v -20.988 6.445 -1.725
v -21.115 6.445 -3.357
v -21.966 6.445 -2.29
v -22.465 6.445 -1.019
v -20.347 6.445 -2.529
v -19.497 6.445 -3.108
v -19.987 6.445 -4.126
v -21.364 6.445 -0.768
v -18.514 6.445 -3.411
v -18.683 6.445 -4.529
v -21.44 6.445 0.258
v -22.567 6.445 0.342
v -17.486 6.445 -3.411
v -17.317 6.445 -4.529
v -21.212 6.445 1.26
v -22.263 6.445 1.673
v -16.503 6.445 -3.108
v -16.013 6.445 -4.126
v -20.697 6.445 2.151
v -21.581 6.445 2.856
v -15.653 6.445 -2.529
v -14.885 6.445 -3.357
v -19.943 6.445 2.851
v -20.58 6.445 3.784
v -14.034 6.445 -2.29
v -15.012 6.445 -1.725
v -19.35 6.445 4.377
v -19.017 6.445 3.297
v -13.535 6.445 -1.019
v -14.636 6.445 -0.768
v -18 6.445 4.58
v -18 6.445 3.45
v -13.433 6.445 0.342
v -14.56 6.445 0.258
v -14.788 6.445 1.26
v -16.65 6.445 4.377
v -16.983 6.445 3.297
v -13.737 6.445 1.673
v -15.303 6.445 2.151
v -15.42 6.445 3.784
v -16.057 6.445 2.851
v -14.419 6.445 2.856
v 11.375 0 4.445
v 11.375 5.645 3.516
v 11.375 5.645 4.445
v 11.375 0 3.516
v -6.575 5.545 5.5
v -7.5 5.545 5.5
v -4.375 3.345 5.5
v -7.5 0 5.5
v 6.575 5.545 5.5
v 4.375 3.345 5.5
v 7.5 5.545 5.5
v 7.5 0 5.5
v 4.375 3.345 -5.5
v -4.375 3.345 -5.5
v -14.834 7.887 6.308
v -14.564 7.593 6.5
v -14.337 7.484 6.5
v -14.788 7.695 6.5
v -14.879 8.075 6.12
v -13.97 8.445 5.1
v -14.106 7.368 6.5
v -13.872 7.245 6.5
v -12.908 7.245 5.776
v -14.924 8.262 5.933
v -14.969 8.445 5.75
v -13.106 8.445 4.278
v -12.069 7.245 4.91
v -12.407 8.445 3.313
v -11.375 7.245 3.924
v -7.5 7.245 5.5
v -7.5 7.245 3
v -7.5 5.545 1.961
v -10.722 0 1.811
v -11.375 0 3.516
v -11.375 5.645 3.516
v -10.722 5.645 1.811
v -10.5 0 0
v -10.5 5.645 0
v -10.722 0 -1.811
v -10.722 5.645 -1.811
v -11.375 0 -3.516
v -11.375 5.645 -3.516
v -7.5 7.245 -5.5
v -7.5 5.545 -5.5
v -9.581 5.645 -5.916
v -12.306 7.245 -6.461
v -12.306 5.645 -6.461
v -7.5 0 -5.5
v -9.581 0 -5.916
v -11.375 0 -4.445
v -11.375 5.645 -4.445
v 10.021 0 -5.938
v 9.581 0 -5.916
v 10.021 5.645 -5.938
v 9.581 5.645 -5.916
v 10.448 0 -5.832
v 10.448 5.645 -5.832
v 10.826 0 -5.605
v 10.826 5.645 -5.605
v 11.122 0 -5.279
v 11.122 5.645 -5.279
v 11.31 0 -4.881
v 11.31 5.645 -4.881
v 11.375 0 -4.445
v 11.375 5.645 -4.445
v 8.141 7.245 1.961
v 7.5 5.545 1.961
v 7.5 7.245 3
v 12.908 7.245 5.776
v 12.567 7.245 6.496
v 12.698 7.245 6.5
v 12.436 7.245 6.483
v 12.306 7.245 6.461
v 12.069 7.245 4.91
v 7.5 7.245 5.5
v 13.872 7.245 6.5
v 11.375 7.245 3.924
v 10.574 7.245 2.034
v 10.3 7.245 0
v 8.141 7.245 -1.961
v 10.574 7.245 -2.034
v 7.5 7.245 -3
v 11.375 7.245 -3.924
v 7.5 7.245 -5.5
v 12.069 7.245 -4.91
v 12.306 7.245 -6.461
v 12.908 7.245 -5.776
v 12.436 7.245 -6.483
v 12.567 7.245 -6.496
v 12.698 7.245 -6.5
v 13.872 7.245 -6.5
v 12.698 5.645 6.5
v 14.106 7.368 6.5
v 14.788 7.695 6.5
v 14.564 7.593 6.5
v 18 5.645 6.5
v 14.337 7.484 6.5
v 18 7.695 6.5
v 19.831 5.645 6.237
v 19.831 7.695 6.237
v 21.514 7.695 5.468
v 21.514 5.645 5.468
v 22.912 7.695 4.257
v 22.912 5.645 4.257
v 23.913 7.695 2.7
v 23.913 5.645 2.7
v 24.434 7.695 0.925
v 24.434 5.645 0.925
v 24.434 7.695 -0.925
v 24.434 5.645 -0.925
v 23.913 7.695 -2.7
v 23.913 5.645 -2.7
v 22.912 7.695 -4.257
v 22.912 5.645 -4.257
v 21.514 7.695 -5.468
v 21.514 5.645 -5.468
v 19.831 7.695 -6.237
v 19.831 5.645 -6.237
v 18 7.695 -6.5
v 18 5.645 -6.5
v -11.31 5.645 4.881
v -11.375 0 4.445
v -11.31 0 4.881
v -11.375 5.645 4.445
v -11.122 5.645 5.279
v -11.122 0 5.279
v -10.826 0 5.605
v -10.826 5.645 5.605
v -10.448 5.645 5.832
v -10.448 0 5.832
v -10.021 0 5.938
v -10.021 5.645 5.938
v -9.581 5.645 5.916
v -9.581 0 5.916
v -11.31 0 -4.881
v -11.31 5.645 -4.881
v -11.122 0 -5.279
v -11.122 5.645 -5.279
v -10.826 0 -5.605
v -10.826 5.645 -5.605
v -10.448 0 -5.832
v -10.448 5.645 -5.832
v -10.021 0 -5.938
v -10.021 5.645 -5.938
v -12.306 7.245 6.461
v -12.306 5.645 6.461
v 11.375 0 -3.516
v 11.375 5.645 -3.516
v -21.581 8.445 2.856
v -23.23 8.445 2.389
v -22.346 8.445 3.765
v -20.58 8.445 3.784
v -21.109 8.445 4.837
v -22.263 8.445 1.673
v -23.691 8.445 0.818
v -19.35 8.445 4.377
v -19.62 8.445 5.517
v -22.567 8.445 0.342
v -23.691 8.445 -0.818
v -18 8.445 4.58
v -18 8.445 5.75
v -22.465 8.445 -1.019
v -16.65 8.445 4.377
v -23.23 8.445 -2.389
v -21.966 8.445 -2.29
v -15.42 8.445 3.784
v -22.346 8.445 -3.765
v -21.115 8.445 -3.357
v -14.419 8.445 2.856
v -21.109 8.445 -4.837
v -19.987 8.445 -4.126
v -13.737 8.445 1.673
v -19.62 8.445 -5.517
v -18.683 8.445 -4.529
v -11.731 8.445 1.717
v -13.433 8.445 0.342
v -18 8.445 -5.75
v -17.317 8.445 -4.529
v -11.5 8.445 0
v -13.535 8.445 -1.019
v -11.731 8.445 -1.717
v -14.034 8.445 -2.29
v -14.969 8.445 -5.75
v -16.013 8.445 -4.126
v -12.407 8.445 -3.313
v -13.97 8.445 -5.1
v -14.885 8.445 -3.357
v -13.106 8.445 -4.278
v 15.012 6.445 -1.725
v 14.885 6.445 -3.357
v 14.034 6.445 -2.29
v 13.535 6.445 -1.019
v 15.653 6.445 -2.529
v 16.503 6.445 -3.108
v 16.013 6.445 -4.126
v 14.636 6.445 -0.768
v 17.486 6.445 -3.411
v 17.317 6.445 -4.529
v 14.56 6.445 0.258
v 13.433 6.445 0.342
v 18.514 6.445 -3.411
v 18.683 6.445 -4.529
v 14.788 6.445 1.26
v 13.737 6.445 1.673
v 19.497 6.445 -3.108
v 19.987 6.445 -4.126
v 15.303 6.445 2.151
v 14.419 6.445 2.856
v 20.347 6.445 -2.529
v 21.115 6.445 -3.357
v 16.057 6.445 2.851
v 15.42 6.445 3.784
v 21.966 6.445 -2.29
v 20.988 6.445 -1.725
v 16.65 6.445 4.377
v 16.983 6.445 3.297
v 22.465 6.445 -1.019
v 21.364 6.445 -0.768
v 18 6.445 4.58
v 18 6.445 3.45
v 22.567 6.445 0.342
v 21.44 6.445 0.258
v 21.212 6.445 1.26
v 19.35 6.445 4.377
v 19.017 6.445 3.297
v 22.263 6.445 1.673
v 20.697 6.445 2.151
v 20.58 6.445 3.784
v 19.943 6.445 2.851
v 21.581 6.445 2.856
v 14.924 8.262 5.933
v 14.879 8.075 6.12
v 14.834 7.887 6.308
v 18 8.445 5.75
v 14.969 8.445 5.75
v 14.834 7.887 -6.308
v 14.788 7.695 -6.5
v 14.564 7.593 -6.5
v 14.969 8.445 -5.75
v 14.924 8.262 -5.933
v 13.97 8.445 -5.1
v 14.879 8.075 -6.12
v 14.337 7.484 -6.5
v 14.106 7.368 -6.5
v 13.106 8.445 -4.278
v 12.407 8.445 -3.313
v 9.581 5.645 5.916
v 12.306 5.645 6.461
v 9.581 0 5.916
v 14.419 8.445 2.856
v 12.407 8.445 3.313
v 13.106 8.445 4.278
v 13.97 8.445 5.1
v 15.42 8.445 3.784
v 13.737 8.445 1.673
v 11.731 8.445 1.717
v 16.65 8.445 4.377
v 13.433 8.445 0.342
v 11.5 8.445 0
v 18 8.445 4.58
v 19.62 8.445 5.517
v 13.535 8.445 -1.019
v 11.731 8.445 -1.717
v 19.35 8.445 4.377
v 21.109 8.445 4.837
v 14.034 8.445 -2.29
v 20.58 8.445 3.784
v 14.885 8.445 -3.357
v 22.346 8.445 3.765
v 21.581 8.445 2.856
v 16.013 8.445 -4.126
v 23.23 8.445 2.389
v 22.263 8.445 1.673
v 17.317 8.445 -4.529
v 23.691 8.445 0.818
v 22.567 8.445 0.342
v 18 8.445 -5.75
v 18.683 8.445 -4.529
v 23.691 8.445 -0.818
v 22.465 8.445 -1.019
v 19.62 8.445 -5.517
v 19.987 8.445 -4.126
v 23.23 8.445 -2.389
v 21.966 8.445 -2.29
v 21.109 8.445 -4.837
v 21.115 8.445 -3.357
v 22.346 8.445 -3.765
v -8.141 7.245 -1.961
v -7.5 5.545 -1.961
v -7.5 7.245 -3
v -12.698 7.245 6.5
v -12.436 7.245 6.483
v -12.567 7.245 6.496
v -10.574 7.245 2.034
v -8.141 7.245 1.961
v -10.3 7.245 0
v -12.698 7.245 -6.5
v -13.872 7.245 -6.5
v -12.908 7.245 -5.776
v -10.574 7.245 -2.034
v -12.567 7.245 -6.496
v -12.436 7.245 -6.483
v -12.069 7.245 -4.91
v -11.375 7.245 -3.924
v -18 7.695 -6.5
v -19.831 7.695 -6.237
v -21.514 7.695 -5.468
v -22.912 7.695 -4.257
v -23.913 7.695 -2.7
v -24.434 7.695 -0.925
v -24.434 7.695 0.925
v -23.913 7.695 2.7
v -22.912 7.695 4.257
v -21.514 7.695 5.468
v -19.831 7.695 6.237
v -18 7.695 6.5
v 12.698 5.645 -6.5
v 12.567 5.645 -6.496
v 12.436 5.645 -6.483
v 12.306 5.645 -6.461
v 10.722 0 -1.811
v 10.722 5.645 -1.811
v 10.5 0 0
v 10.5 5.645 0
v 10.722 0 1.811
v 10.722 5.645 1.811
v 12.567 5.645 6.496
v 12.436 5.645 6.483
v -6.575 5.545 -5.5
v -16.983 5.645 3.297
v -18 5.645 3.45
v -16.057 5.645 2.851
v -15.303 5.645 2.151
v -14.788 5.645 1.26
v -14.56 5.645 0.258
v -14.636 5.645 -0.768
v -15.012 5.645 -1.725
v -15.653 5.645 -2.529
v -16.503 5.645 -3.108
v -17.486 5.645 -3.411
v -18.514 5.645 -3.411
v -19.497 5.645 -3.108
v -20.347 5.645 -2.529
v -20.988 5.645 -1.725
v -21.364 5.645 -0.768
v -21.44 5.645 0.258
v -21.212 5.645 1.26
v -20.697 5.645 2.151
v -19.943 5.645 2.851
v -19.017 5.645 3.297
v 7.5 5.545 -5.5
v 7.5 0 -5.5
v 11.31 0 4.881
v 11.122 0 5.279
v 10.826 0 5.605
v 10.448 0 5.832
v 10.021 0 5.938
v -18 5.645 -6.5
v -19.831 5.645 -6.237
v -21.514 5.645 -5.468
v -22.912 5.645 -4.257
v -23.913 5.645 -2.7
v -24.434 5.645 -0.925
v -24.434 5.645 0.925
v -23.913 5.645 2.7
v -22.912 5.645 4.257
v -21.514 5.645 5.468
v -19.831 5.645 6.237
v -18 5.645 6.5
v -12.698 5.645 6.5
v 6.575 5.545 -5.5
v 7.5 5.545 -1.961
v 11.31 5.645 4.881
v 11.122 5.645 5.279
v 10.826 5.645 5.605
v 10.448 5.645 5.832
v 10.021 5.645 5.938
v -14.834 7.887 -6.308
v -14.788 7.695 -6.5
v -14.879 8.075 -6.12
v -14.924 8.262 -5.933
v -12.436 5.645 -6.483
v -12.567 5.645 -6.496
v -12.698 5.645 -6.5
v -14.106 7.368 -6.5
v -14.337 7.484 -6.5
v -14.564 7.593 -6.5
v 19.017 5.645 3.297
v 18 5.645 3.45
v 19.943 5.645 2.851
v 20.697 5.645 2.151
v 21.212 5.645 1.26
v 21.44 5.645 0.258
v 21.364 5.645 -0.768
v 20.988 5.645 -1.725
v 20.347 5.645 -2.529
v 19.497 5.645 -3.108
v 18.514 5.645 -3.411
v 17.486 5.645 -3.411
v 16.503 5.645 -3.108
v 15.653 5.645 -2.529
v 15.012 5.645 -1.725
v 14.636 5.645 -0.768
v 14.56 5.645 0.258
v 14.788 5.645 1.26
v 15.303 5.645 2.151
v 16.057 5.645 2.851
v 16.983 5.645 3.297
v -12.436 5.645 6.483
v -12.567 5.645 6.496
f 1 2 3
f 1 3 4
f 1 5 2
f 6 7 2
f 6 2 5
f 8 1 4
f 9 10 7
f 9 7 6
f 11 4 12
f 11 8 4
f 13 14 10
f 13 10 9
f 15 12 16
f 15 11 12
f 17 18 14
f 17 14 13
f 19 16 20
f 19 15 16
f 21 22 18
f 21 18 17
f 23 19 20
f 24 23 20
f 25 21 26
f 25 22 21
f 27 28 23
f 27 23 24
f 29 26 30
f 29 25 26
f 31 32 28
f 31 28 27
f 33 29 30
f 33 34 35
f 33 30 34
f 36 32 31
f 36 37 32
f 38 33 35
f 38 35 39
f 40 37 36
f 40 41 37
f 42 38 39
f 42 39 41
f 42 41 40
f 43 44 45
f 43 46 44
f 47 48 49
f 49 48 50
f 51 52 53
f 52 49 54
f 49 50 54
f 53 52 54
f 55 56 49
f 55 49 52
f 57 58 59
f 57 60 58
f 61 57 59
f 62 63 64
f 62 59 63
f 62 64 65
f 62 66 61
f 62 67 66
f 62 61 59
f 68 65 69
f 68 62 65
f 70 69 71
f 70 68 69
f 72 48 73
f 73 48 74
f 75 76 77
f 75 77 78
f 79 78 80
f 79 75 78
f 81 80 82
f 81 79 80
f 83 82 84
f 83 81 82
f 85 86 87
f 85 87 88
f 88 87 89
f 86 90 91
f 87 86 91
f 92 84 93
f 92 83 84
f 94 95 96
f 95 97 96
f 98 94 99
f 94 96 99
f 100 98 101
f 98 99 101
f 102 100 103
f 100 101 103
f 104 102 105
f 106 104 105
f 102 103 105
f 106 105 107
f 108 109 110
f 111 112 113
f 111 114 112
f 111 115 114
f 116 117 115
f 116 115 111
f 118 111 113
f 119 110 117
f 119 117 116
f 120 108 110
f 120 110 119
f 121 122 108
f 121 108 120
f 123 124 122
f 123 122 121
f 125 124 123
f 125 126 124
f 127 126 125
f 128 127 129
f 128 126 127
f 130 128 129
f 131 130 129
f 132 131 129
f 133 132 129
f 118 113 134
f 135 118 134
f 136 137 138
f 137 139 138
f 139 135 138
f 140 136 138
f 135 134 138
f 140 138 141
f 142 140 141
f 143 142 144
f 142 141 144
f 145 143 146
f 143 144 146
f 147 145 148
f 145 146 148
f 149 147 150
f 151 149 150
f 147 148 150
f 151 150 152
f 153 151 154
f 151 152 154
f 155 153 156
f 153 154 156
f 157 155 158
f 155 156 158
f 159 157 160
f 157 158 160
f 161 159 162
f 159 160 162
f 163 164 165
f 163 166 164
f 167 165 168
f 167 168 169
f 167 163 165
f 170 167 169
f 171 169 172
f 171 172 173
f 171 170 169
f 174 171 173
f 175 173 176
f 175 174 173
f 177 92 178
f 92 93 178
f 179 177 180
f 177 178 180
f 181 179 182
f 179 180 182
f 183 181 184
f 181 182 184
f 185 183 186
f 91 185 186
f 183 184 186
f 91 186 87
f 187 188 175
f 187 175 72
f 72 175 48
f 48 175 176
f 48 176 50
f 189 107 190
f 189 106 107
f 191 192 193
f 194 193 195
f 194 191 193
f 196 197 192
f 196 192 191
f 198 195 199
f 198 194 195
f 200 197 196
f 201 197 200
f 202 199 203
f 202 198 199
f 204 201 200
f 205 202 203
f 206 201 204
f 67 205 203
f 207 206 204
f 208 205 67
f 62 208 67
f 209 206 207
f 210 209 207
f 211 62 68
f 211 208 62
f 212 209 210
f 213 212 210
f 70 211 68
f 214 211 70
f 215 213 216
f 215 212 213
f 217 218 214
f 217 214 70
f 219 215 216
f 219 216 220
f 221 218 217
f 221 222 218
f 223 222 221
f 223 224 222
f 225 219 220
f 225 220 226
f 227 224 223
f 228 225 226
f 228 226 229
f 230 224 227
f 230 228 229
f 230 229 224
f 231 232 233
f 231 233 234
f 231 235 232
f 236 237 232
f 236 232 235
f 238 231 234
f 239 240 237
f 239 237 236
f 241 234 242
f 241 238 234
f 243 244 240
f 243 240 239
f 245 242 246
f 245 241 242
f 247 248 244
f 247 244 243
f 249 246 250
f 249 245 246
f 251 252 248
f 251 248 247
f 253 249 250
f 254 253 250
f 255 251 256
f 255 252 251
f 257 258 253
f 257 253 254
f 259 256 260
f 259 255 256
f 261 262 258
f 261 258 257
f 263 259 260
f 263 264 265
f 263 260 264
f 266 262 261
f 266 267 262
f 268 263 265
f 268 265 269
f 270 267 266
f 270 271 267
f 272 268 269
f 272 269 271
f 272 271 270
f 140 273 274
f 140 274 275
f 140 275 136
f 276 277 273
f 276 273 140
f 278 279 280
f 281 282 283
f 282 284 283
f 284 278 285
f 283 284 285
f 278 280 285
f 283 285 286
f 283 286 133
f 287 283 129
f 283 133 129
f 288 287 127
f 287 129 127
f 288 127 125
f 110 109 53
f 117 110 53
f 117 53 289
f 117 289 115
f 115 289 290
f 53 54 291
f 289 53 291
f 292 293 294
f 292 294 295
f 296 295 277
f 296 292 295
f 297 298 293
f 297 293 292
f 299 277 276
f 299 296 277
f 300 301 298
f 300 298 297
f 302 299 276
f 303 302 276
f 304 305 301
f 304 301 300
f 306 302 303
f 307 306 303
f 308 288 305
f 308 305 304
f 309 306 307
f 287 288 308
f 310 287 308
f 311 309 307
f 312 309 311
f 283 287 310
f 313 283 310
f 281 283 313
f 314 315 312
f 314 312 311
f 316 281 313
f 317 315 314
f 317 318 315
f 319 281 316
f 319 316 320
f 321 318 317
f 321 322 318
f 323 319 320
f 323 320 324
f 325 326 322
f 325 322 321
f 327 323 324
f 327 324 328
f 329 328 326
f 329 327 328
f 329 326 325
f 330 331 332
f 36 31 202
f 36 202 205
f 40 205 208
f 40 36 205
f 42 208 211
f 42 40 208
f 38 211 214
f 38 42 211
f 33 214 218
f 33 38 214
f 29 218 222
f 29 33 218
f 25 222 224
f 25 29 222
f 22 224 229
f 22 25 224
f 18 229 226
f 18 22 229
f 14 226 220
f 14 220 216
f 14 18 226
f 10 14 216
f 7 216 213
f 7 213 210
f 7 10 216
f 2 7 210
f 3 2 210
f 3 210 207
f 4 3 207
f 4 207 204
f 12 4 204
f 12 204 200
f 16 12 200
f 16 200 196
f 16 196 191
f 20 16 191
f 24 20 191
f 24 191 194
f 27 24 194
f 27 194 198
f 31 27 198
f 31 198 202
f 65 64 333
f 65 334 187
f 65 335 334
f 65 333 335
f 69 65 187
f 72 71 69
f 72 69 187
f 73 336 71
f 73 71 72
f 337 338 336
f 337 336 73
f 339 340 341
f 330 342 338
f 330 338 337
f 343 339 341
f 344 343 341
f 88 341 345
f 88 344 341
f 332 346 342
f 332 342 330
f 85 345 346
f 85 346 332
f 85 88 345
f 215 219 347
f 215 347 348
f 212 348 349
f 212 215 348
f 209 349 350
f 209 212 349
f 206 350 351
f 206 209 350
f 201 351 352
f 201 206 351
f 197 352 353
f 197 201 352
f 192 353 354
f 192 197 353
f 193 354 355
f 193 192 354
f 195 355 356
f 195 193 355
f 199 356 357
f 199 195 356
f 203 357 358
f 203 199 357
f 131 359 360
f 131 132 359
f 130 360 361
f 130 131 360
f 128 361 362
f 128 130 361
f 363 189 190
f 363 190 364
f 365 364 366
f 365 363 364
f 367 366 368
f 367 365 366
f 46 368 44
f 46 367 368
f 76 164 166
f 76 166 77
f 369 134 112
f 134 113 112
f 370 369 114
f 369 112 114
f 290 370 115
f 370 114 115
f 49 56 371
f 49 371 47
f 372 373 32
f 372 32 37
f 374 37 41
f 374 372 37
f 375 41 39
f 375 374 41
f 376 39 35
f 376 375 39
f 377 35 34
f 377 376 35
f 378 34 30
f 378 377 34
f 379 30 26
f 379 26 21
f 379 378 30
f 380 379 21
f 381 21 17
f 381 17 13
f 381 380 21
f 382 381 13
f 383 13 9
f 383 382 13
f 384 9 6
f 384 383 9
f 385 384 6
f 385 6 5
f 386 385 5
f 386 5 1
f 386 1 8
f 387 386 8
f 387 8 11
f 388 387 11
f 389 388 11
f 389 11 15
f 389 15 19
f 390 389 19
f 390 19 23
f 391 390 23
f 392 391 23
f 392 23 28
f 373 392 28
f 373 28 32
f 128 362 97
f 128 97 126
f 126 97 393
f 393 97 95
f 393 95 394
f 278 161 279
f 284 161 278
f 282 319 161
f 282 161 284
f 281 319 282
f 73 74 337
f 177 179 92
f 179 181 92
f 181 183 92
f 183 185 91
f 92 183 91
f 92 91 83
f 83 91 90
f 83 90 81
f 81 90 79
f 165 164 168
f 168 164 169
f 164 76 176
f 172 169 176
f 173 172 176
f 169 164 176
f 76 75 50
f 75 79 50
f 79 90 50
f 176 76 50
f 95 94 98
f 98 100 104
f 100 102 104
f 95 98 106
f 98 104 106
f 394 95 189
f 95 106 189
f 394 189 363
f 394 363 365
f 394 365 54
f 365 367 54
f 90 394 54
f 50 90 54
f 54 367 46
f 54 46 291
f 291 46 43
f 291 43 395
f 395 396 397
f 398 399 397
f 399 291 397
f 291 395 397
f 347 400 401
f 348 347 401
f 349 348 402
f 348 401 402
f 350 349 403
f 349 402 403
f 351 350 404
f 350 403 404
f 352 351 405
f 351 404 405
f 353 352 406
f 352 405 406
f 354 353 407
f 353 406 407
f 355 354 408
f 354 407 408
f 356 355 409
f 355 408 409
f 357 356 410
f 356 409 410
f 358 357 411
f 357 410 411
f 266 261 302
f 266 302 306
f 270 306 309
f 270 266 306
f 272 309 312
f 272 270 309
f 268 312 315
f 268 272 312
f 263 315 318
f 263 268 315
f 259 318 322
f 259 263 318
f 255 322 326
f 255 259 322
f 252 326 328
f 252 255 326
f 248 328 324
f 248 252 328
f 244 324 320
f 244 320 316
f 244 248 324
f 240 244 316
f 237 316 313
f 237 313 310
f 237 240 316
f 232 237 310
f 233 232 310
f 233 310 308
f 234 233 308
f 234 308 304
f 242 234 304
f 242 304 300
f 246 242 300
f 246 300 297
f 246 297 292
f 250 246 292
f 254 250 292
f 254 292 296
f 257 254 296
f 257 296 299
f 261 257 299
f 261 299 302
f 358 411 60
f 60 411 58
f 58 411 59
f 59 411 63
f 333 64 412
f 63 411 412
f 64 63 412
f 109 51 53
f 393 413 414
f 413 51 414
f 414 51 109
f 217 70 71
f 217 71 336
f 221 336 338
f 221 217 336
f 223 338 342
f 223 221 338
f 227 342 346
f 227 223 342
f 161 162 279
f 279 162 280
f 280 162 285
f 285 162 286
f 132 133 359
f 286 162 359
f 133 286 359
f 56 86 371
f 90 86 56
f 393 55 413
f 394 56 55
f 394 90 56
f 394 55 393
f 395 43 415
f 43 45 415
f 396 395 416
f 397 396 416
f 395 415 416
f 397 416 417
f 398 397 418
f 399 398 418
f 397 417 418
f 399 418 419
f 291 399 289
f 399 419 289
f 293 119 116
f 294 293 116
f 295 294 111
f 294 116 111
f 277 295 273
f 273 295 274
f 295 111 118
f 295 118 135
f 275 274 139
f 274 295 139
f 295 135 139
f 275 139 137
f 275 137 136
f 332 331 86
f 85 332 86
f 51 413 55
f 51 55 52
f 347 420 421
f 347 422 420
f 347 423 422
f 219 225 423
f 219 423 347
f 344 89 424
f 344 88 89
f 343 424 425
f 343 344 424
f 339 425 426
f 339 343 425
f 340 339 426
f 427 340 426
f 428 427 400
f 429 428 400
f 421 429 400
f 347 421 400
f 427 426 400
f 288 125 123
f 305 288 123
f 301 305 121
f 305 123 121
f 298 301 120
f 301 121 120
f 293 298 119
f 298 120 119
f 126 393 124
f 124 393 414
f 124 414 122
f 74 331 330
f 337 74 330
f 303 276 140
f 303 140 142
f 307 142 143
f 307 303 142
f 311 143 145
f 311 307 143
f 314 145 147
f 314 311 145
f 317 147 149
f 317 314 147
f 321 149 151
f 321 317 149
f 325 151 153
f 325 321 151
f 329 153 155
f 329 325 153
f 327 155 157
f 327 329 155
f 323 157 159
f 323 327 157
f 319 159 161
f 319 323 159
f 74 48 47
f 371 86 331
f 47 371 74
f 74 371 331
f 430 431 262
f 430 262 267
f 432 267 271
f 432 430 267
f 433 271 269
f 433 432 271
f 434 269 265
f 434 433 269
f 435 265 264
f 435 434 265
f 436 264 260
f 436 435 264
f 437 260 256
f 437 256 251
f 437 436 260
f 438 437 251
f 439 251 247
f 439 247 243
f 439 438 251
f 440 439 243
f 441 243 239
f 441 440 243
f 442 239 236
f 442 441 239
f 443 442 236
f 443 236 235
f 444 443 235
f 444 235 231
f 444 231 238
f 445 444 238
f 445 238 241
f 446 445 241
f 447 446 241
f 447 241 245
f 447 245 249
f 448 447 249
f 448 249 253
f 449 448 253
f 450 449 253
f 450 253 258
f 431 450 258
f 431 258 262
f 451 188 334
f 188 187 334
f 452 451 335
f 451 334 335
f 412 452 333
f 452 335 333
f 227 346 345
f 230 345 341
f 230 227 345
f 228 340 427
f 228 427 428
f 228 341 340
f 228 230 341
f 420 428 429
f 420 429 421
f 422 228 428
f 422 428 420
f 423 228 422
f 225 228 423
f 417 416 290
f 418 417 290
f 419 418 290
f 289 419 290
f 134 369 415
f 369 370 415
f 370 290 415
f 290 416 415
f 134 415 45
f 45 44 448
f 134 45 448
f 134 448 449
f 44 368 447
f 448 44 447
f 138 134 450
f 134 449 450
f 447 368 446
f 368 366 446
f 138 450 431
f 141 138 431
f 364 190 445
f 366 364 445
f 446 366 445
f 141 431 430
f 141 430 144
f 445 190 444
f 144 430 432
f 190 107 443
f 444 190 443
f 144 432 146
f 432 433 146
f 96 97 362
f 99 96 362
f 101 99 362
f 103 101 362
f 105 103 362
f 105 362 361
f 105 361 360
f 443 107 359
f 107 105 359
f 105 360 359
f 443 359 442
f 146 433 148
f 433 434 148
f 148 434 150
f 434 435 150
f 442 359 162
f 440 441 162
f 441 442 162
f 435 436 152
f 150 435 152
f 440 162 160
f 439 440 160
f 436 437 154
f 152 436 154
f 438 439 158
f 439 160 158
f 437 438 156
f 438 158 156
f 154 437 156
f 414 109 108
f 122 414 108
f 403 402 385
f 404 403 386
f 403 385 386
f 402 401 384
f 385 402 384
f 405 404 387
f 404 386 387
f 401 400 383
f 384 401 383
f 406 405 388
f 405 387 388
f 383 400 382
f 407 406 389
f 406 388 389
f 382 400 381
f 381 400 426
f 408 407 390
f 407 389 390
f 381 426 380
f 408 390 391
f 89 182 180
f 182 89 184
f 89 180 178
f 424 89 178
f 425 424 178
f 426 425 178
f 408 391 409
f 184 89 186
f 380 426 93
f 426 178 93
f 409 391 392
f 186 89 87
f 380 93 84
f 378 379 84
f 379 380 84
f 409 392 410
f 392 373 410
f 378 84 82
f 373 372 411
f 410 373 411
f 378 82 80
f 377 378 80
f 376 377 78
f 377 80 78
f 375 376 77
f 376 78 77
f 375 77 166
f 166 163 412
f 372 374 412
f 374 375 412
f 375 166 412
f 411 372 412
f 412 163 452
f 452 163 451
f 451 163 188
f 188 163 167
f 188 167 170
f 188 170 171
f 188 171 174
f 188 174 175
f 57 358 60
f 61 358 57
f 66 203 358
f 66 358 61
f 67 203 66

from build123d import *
from OCP.BRepFilletAPI import BRepFilletAPI_MakeChamfer

# Parameters (mm, degrees)
SKETCH1_W               = 15
SKETCH1_H               = 11
BOSS_EXTRUDE1_DEPTH     = 5.545
BOSS_EXTRUDE2_DEPTH     = 7.245
SKETCH1_6_R             = 6.5
SKETCH1_6_R_2           = 4.58
BOSS_EXTRUDE3_DEPTH     = 8.445
SKETCH1_7_R             = 4.58
SKETCH1_7_R_2           = 3.45
BOSS_EXTRUDE4_DEPTH     = 6.445
SKETCH1_8_R             = 6.5
SKETCH1_8_R_2           = 4.58
SKETCH1_8_R_3           = 3.45
CUT_EXTRUDE1_DEPTH      = 5.645
CUT_EXTRUDE2_DEPTH      = 3
CUT_EXTRUDE3_DEPTH      = 27.717373093
CUT_EXTRUDE3_DEPTH_BACK = 27.717373093
SKETCH2_4_W             = 8.75
SKETCH2_4_H             = 2.2
CHAMFER1_SIZE           = 1.039230485
CHAMFER1_SIZE_2         = 0.6
CHAMFER2_SIZE           = 2.2
CHAMFER3_SIZE           = 0.75
CHAMFER4_SIZE           = 1.2
FILLET1_R               = 2
FILLET2_R               = 1.5


with BuildPart() as part:
    # Sketch1 → Boss-Extrude1 (new body)
    with BuildSketch(Plane(origin=(0, 0, 0), x_dir=(1, 0, 0), z_dir=(0, 1, 0))):
        Rectangle(SKETCH1_W, SKETCH1_H)
    extrude(amount=BOSS_EXTRUDE1_DEPTH)

    # Sketch1<5> → Boss-Extrude2 (add)
    with BuildSketch(Plane(origin=(0, 0, 0), x_dir=(1, 0, 0), z_dir=(0, 1, 0))):
        with BuildLine():
            Line((-12.5, 6.5), (-13.872046512, 6.5))
            ThreePointArc((-13.872046512, 6.5), (-12.47142118, 5.359553734), (-11.375, 3.924203741))
            Line((-11.375, 3.924203741), (-11.375, 6.275))
            Line((-11.375, 6.275), (-12.5, 6.5))
        make_face()
        with BuildLine():
            Line((-11.375, 6.275), (-11.375, 3.924203741))
            ThreePointArc((-11.375, 3.924203741), (-10.3, 0), (-11.375, -3.924203741))
            Line((-11.375, -3.924203741), (-11.375, -6.275))
            Line((-11.375, -6.275), (-7.5, -5.5))
            Line((-7.5, -5.5), (-7.5, 5.5))
            Line((-7.5, 5.5), (-11.375, 6.275))
        make_face()
        with BuildLine():
            ThreePointArc((-11.375, -3.924203741), (-12.47142118, -5.359553734), (-13.872046512, -6.5))
            Line((-13.872046512, -6.5), (-12.5, -6.5))
            Line((-12.5, -6.5), (-11.375, -6.275))
            Line((-11.375, -6.275), (-11.375, -3.924203741))
        make_face()
        with BuildLine():
            Line((12.5, 6.5), (11.375, 6.275))
            Line((11.375, 6.275), (11.375, 3.924203741))
            ThreePointArc((11.375, 3.924203741), (12.47142118, 5.359553734), (13.872046512, 6.5))
            Line((13.872046512, 6.5), (12.5, 6.5))
        make_face()
        with BuildLine():
            Line((11.375, 6.275), (7.5, 5.5))
            Line((7.5, 5.5), (7.5, -5.5))
            Line((7.5, -5.5), (11.375, -6.275))
            Line((11.375, -6.275), (11.375, -3.924203741))
            ThreePointArc((11.375, -3.924203741), (10.3, 0), (11.375, 3.924203741))
            Line((11.375, 3.924203741), (11.375, 6.275))
        make_face()
        with BuildLine():
            Line((11.375, -3.924203741), (11.375, -6.275))
            Line((11.375, -6.275), (12.5, -6.5))
            Line((12.5, -6.5), (13.872046512, -6.5))
            ThreePointArc((13.872046512, -6.5), (12.47142118, -5.359553734), (11.375, -3.924203741))
        make_face()
    extrude(amount=BOSS_EXTRUDE2_DEPTH)

    # Sketch1<6> → Boss-Extrude3 (add)
    # profile 1 of 6: a face of its own
    with BuildSketch(Plane(origin=(0, 0, 0), x_dir=(1, 0, 0), z_dir=(0, 1, 0))):
        with BuildLine():
            Line((-13.872046512, 6.5), (-18, 6.5))
            ThreePointArc((-18, 6.5), (-13.403805922, 4.596194078), (-11.5, 0))
            ThreePointArc((-11.5, 0), (-13.403805922, -4.596194078), (-18, -6.5))
            Line((-18, -6.5), (-13.872046512, -6.5))
            ThreePointArc((-13.872046512, -6.5), (-12.47142118, -5.359553734), (-11.375, -3.924203741))
            Line((-11.375, -3.924203741), (-11.375, -3.515590278))
            ThreePointArc((-11.375, -3.515590278), (-10.5, 0), (-11.375, 3.515590278))
            Line((-11.375, 3.515590278), (-11.375, 3.924203741))
            ThreePointArc((-11.375, 3.924203741), (-12.47142118, 5.359553734), (-13.872046512, 6.5))
        make_face()
    # profile 2 of 6: a face of its own
    with BuildSketch(Plane(origin=(0, 0, 0), x_dir=(1, 0, 0), z_dir=(0, 1, 0))):
        with Locations((-18, 0)):
            Circle(SKETCH1_6_R)
        with Locations(Location((-18, 0, 0), (0, 0, 270))):
            Circle(SKETCH1_6_R_2, mode=Mode.SUBTRACT)
    # profile 3 of 6: a face of its own
    with BuildSketch(Plane(origin=(0, 0, 0), x_dir=(1, 0, 0), z_dir=(0, 1, 0))):
        with BuildLine():
            ThreePointArc((13.872046512, 6.5), (12.47142118, 5.359553734), (11.375, 3.924203741))
            Line((11.375, 3.924203741), (11.375, 3.515590278))
            ThreePointArc((11.375, 3.515590278), (10.5, 0), (11.375, -3.515590278))
            Line((11.375, -3.515590278), (11.375, -3.924203741))
            ThreePointArc((11.375, -3.924203741), (12.47142118, -5.359553734), (13.872046512, -6.5))
            Line((13.872046512, -6.5), (18, -6.5))
            ThreePointArc((18, -6.5), (11.5, 0), (18, 6.5))
            Line((18, 6.5), (13.872046512, 6.5))
        make_face()
    # profile 4 of 6: a face of its own
    with BuildSketch(Plane(origin=(0, 0, 0), x_dir=(1, 0, 0), z_dir=(0, 1, 0))):
        with Locations((18, 0)):
            Circle(SKETCH1_6_R)
        with Locations(Location((18, 0, 0), (0, 0, 270))):
            Circle(SKETCH1_6_R_2, mode=Mode.SUBTRACT)
    # profile 5 of 6: a face of its own
    with BuildSketch(Plane(origin=(0, 0, 0), x_dir=(1, 0, 0), z_dir=(0, 1, 0))):
        with BuildLine():
            Line((11.375, 3.515590278), (11.375, 3.924203741))
            ThreePointArc((11.375, 3.924203741), (10.3, 0), (11.375, -3.924203741))
            Line((11.375, -3.924203741), (11.375, -3.515590278))
            ThreePointArc((11.375, -3.515590278), (10.5, 0), (11.375, 3.515590278))
        make_face()
    # profile 6 of 6: a face of its own
    with BuildSketch(Plane(origin=(0, 0, 0), x_dir=(1, 0, 0), z_dir=(0, 1, 0))):
        with BuildLine():
            ThreePointArc((-11.375, -3.924203741), (-10.3, 0), (-11.375, 3.924203741))
            Line((-11.375, 3.924203741), (-11.375, 3.515590278))
            ThreePointArc((-11.375, 3.515590278), (-10.5, 0), (-11.375, -3.515590278))
            Line((-11.375, -3.515590278), (-11.375, -3.924203741))
        make_face()
    extrude(amount=BOSS_EXTRUDE3_DEPTH)

    # Sketch1<7> → Boss-Extrude4 (add)
    # profile 1 of 2: a face of its own
    with BuildSketch(Plane(origin=(0, 0, 0), x_dir=(1, 0, 0), z_dir=(0, 1, 0))):
        with Locations(Location((-18, 0, 0), (0, 0, 270))):
            Circle(SKETCH1_7_R)
        with Locations(Location((-18, 0, 0), (0, 0, 270))):
            Circle(SKETCH1_7_R_2, mode=Mode.SUBTRACT)
    # profile 2 of 2: a face of its own
    with BuildSketch(Plane(origin=(0, 0, 0), x_dir=(1, 0, 0), z_dir=(0, 1, 0))):
        with Locations(Location((18, 0, 0), (0, 0, 270))):
            Circle(SKETCH1_7_R)
        with Locations(Location((18, 0, 0), (0, 0, 270))):
            Circle(SKETCH1_7_R_2, mode=Mode.SUBTRACT)
    extrude(amount=BOSS_EXTRUDE4_DEPTH)

    # Sketch1<8> → Cut-Extrude1 (cut)
    # profile 1 of 10: a face of its own
    with BuildSketch(Plane(origin=(0, 0, 0), x_dir=(1, 0, 0), z_dir=(0, 1, 0))):
        with Locations((-18, 0)):
            Circle(SKETCH1_8_R)
        with Locations(Location((-18, 0, 0), (0, 0, 270))):
            Circle(SKETCH1_8_R_2, mode=Mode.SUBTRACT)
    # profile 2 of 10: a face of its own
    with BuildSketch(Plane(origin=(0, 0, 0), x_dir=(1, 0, 0), z_dir=(0, 1, 0))):
        with Locations(Location((-18, 0, 0), (0, 0, 270))):
            Circle(SKETCH1_8_R_2)
        with Locations(Location((-18, 0, 0), (0, 0, 270))):
            Circle(SKETCH1_8_R_3, mode=Mode.SUBTRACT)
    # profile 3 of 10: a face of its own
    with BuildSketch(Plane(origin=(0, 0, 0), x_dir=(1, 0, 0), z_dir=(0, 1, 0))):
        with BuildLine():
            Line((-13.872046512, 6.5), (-18, 6.5))
            ThreePointArc((-18, 6.5), (-13.403805922, 4.596194078), (-11.5, 0))
            ThreePointArc((-11.5, 0), (-13.403805922, -4.596194078), (-18, -6.5))
            Line((-18, -6.5), (-13.872046512, -6.5))
            ThreePointArc((-13.872046512, -6.5), (-12.47142118, -5.359553734), (-11.375, -3.924203741))
            Line((-11.375, -3.924203741), (-11.375, -3.515590278))
            ThreePointArc((-11.375, -3.515590278), (-10.5, 0), (-11.375, 3.515590278))
            Line((-11.375, 3.515590278), (-11.375, 3.924203741))
            ThreePointArc((-11.375, 3.924203741), (-12.47142118, 5.359553734), (-13.872046512, 6.5))
        make_face()
    # profile 4 of 10: a face of its own
    with BuildSketch(Plane(origin=(0, 0, 0), x_dir=(1, 0, 0), z_dir=(0, 1, 0))):
        with BuildLine():
            Line((-12.5, 6.5), (-13.872046512, 6.5))
            ThreePointArc((-13.872046512, 6.5), (-12.47142118, 5.359553734), (-11.375, 3.924203741))
            Line((-11.375, 3.924203741), (-11.375, 6.275))
            Line((-11.375, 6.275), (-12.5, 6.5))
        make_face()
    # profile 5 of 10: a face of its own
    with BuildSketch(Plane(origin=(0, 0, 0), x_dir=(1, 0, 0), z_dir=(0, 1, 0))):
        with BuildLine():
            ThreePointArc((-11.375, -3.924203741), (-12.47142118, -5.359553734), (-13.872046512, -6.5))
            Line((-13.872046512, -6.5), (-12.5, -6.5))
            Line((-12.5, -6.5), (-11.375, -6.275))
            Line((-11.375, -6.275), (-11.375, -3.924203741))
        make_face()
    # profile 6 of 10: a face of its own
    with BuildSketch(Plane(origin=(0, 0, 0), x_dir=(1, 0, 0), z_dir=(0, 1, 0))):
        with BuildLine():
            Line((12.5, 6.5), (11.375, 6.275))
            Line((11.375, 6.275), (11.375, 3.924203741))
            ThreePointArc((11.375, 3.924203741), (12.47142118, 5.359553734), (13.872046512, 6.5))
            Line((13.872046512, 6.5), (12.5, 6.5))
        make_face()
    # profile 7 of 10: a face of its own
    with BuildSketch(Plane(origin=(0, 0, 0), x_dir=(1, 0, 0), z_dir=(0, 1, 0))):
        with BuildLine():
            Line((11.375, -3.924203741), (11.375, -6.275))
            Line((11.375, -6.275), (12.5, -6.5))
            Line((12.5, -6.5), (13.872046512, -6.5))
            ThreePointArc((13.872046512, -6.5), (12.47142118, -5.359553734), (11.375, -3.924203741))
        make_face()
    # profile 8 of 10: a face of its own
    with BuildSketch(Plane(origin=(0, 0, 0), x_dir=(1, 0, 0), z_dir=(0, 1, 0))):
        with BuildLine():
            ThreePointArc((13.872046512, 6.5), (12.47142118, 5.359553734), (11.375, 3.924203741))
            Line((11.375, 3.924203741), (11.375, 3.515590278))
            ThreePointArc((11.375, 3.515590278), (10.5, 0), (11.375, -3.515590278))
            Line((11.375, -3.515590278), (11.375, -3.924203741))
            ThreePointArc((11.375, -3.924203741), (12.47142118, -5.359553734), (13.872046512, -6.5))
            Line((13.872046512, -6.5), (18, -6.5))
            ThreePointArc((18, -6.5), (11.5, 0), (18, 6.5))
            Line((18, 6.5), (13.872046512, 6.5))
        make_face()
    # profile 9 of 10: a face of its own
    with BuildSketch(Plane(origin=(0, 0, 0), x_dir=(1, 0, 0), z_dir=(0, 1, 0))):
        with Locations((18, 0)):
            Circle(SKETCH1_8_R)
        with Locations(Location((18, 0, 0), (0, 0, 270))):
            Circle(SKETCH1_8_R_2, mode=Mode.SUBTRACT)
    # profile 10 of 10: a face of its own
    with BuildSketch(Plane(origin=(0, 0, 0), x_dir=(1, 0, 0), z_dir=(0, 1, 0))):
        with Locations(Location((18, 0, 0), (0, 0, 270))):
            Circle(SKETCH1_8_R_2)
        with Locations(Location((18, 0, 0), (0, 0, 270))):
            Circle(SKETCH1_8_R_3, mode=Mode.SUBTRACT)
    extrude(amount=CUT_EXTRUDE1_DEPTH, mode=Mode.SUBTRACT)

    # Sketch2 → Cut-Extrude2 (cut, symmetric)
    with BuildSketch(Plane.XY):
        Polygon((-7.5, 5.545), (-8.141268506, 7.245), (-7.5, 7.245), align=None)
        Polygon((7.5, 5.545), (8.141268506, 7.245), (7.5, 7.245), align=None)
    extrude(amount=CUT_EXTRUDE2_DEPTH, both=True, mode=Mode.SUBTRACT)

    # Sketch2<4> → Cut-Extrude3 (cut, two sides: drawn at the far end of the back side and taken through both)
    with BuildSketch(Plane.XY.offset(-CUT_EXTRUDE3_DEPTH_BACK)):
        with Locations((0, 4.445)):
            Rectangle(SKETCH2_4_W, SKETCH2_4_H)
    extrude(amount=CUT_EXTRUDE3_DEPTH + CUT_EXTRUDE3_DEPTH_BACK, mode=Mode.SUBTRACT)

    # Chamfer1
    chamfer1_edges_1 = [part.edges().sort_by_distance(p)[0] for p in [
        (7.820634253, 6.395, 3),
    ]]
    chamfer1_side_1 = [part.faces().sort_by_distance(p)[0] for p in [
        (7.820634253, 6.395, 2.988),
    ]]
    chamfer1_edges_2 = [part.edges().sort_by_distance(p)[0] for p in [
        (7.820634253, 6.395, -3),
    ]]
    chamfer1_side_2 = [part.faces().sort_by_distance(p)[0] for p in [
        (7.820634253, 6.395, -2.988),
    ]]
    chamfer1_edges_3 = [part.edges().sort_by_distance(p)[0] for p in [
        (-7.820634253, 6.395, 3),
    ]]
    chamfer1_side_3 = [part.faces().sort_by_distance(p)[0] for p in [
        (-7.820634253, 6.395, 2.988),
    ]]
    chamfer1_edges_4 = [part.edges().sort_by_distance(p)[0] for p in [
        (-7.820634253, 6.395, -3),
    ]]
    chamfer1_side_4 = [part.faces().sort_by_distance(p)[0] for p in [
        (-7.820634253, 6.395, -2.988),
    ]]
    chamfer1 = BRepFilletAPI_MakeChamfer(part.part.solid().wrapped)
    for e in chamfer1_edges_1:
        chamfer1.Add(CHAMFER1_SIZE - 0.0001, CHAMFER1_SIZE_2 - 0.0001, e.wrapped, chamfer1_side_1[0].wrapped)
    for e in chamfer1_edges_2:
        chamfer1.Add(CHAMFER1_SIZE - 0.0001, CHAMFER1_SIZE_2 - 0.0001, e.wrapped, chamfer1_side_2[0].wrapped)
    for e in chamfer1_edges_3:
        chamfer1.Add(CHAMFER1_SIZE - 0.0001, CHAMFER1_SIZE_2 - 0.0001, e.wrapped, chamfer1_side_3[0].wrapped)
    for e in chamfer1_edges_4:
        chamfer1.Add(CHAMFER1_SIZE - 0.0001, CHAMFER1_SIZE_2 - 0.0001, e.wrapped, chamfer1_side_4[0].wrapped)
    add(Compound.cast(chamfer1.Shape()), mode=Mode.REPLACE)  # a hair under: the kernel refuses the full size

    # Chamfer2
    chamfer2_edges = [part.edges().sort_by_distance(p)[0] for p in [
        (4.375, 5.545, 0),
        (-4.375, 5.545, 0),
    ]]
    chamfer(chamfer2_edges, length=CHAMFER2_SIZE - 0.0001)  # a hair under: the kernel refuses the full size

    # Chamfer3
    chamfer3_edges = [part.edges().sort_by_distance(p)[0] for p in [
        (15.936023256, 8.445, 6.5),
        (24.5, 8.445, 0),
        (15.936023256, 8.445, -6.5),
        (-15.936023256, 8.445, -6.5),
        (-24.5, 8.445, 0),
        (-15.936023256, 8.445, 6.5),
    ]]
    chamfer(chamfer3_edges, length=CHAMFER3_SIZE)

    # Chamfer4
    chamfer4_edges = [part.edges().sort_by_distance(p)[0] for p in [
        (-10.3, 8.445, 0),
        (10.3, 8.445, 0),
    ]]
    chamfer(chamfer4_edges, length=CHAMFER4_SIZE - 0.0001)  # a hair under: the kernel refuses the full size

    # Fillet1
    fillet1_edges = [part.edges().sort_by_distance(p)[0] for p in [
        (-12.5, 6.445, 6.5),
        (-12.5, 6.445, -6.5),
        (12.5, 6.445, -6.5),
        (12.5, 6.445, 6.5),
    ]]
    fillet(fillet1_edges, radius=FILLET1_R)

    # Fillet2
    fillet2_edges = [part.edges().sort_by_distance(p)[0] for p in [
        (-11.375, 2.8225, 6.275),
        (-11.375, 2.8225, -6.275),
        (11.375, 2.8225, -6.275),
        (11.375, 2.8225, 6.275),
    ]]
    fillet(fillet2_edges, radius=FILLET2_R)


solid = part.part
